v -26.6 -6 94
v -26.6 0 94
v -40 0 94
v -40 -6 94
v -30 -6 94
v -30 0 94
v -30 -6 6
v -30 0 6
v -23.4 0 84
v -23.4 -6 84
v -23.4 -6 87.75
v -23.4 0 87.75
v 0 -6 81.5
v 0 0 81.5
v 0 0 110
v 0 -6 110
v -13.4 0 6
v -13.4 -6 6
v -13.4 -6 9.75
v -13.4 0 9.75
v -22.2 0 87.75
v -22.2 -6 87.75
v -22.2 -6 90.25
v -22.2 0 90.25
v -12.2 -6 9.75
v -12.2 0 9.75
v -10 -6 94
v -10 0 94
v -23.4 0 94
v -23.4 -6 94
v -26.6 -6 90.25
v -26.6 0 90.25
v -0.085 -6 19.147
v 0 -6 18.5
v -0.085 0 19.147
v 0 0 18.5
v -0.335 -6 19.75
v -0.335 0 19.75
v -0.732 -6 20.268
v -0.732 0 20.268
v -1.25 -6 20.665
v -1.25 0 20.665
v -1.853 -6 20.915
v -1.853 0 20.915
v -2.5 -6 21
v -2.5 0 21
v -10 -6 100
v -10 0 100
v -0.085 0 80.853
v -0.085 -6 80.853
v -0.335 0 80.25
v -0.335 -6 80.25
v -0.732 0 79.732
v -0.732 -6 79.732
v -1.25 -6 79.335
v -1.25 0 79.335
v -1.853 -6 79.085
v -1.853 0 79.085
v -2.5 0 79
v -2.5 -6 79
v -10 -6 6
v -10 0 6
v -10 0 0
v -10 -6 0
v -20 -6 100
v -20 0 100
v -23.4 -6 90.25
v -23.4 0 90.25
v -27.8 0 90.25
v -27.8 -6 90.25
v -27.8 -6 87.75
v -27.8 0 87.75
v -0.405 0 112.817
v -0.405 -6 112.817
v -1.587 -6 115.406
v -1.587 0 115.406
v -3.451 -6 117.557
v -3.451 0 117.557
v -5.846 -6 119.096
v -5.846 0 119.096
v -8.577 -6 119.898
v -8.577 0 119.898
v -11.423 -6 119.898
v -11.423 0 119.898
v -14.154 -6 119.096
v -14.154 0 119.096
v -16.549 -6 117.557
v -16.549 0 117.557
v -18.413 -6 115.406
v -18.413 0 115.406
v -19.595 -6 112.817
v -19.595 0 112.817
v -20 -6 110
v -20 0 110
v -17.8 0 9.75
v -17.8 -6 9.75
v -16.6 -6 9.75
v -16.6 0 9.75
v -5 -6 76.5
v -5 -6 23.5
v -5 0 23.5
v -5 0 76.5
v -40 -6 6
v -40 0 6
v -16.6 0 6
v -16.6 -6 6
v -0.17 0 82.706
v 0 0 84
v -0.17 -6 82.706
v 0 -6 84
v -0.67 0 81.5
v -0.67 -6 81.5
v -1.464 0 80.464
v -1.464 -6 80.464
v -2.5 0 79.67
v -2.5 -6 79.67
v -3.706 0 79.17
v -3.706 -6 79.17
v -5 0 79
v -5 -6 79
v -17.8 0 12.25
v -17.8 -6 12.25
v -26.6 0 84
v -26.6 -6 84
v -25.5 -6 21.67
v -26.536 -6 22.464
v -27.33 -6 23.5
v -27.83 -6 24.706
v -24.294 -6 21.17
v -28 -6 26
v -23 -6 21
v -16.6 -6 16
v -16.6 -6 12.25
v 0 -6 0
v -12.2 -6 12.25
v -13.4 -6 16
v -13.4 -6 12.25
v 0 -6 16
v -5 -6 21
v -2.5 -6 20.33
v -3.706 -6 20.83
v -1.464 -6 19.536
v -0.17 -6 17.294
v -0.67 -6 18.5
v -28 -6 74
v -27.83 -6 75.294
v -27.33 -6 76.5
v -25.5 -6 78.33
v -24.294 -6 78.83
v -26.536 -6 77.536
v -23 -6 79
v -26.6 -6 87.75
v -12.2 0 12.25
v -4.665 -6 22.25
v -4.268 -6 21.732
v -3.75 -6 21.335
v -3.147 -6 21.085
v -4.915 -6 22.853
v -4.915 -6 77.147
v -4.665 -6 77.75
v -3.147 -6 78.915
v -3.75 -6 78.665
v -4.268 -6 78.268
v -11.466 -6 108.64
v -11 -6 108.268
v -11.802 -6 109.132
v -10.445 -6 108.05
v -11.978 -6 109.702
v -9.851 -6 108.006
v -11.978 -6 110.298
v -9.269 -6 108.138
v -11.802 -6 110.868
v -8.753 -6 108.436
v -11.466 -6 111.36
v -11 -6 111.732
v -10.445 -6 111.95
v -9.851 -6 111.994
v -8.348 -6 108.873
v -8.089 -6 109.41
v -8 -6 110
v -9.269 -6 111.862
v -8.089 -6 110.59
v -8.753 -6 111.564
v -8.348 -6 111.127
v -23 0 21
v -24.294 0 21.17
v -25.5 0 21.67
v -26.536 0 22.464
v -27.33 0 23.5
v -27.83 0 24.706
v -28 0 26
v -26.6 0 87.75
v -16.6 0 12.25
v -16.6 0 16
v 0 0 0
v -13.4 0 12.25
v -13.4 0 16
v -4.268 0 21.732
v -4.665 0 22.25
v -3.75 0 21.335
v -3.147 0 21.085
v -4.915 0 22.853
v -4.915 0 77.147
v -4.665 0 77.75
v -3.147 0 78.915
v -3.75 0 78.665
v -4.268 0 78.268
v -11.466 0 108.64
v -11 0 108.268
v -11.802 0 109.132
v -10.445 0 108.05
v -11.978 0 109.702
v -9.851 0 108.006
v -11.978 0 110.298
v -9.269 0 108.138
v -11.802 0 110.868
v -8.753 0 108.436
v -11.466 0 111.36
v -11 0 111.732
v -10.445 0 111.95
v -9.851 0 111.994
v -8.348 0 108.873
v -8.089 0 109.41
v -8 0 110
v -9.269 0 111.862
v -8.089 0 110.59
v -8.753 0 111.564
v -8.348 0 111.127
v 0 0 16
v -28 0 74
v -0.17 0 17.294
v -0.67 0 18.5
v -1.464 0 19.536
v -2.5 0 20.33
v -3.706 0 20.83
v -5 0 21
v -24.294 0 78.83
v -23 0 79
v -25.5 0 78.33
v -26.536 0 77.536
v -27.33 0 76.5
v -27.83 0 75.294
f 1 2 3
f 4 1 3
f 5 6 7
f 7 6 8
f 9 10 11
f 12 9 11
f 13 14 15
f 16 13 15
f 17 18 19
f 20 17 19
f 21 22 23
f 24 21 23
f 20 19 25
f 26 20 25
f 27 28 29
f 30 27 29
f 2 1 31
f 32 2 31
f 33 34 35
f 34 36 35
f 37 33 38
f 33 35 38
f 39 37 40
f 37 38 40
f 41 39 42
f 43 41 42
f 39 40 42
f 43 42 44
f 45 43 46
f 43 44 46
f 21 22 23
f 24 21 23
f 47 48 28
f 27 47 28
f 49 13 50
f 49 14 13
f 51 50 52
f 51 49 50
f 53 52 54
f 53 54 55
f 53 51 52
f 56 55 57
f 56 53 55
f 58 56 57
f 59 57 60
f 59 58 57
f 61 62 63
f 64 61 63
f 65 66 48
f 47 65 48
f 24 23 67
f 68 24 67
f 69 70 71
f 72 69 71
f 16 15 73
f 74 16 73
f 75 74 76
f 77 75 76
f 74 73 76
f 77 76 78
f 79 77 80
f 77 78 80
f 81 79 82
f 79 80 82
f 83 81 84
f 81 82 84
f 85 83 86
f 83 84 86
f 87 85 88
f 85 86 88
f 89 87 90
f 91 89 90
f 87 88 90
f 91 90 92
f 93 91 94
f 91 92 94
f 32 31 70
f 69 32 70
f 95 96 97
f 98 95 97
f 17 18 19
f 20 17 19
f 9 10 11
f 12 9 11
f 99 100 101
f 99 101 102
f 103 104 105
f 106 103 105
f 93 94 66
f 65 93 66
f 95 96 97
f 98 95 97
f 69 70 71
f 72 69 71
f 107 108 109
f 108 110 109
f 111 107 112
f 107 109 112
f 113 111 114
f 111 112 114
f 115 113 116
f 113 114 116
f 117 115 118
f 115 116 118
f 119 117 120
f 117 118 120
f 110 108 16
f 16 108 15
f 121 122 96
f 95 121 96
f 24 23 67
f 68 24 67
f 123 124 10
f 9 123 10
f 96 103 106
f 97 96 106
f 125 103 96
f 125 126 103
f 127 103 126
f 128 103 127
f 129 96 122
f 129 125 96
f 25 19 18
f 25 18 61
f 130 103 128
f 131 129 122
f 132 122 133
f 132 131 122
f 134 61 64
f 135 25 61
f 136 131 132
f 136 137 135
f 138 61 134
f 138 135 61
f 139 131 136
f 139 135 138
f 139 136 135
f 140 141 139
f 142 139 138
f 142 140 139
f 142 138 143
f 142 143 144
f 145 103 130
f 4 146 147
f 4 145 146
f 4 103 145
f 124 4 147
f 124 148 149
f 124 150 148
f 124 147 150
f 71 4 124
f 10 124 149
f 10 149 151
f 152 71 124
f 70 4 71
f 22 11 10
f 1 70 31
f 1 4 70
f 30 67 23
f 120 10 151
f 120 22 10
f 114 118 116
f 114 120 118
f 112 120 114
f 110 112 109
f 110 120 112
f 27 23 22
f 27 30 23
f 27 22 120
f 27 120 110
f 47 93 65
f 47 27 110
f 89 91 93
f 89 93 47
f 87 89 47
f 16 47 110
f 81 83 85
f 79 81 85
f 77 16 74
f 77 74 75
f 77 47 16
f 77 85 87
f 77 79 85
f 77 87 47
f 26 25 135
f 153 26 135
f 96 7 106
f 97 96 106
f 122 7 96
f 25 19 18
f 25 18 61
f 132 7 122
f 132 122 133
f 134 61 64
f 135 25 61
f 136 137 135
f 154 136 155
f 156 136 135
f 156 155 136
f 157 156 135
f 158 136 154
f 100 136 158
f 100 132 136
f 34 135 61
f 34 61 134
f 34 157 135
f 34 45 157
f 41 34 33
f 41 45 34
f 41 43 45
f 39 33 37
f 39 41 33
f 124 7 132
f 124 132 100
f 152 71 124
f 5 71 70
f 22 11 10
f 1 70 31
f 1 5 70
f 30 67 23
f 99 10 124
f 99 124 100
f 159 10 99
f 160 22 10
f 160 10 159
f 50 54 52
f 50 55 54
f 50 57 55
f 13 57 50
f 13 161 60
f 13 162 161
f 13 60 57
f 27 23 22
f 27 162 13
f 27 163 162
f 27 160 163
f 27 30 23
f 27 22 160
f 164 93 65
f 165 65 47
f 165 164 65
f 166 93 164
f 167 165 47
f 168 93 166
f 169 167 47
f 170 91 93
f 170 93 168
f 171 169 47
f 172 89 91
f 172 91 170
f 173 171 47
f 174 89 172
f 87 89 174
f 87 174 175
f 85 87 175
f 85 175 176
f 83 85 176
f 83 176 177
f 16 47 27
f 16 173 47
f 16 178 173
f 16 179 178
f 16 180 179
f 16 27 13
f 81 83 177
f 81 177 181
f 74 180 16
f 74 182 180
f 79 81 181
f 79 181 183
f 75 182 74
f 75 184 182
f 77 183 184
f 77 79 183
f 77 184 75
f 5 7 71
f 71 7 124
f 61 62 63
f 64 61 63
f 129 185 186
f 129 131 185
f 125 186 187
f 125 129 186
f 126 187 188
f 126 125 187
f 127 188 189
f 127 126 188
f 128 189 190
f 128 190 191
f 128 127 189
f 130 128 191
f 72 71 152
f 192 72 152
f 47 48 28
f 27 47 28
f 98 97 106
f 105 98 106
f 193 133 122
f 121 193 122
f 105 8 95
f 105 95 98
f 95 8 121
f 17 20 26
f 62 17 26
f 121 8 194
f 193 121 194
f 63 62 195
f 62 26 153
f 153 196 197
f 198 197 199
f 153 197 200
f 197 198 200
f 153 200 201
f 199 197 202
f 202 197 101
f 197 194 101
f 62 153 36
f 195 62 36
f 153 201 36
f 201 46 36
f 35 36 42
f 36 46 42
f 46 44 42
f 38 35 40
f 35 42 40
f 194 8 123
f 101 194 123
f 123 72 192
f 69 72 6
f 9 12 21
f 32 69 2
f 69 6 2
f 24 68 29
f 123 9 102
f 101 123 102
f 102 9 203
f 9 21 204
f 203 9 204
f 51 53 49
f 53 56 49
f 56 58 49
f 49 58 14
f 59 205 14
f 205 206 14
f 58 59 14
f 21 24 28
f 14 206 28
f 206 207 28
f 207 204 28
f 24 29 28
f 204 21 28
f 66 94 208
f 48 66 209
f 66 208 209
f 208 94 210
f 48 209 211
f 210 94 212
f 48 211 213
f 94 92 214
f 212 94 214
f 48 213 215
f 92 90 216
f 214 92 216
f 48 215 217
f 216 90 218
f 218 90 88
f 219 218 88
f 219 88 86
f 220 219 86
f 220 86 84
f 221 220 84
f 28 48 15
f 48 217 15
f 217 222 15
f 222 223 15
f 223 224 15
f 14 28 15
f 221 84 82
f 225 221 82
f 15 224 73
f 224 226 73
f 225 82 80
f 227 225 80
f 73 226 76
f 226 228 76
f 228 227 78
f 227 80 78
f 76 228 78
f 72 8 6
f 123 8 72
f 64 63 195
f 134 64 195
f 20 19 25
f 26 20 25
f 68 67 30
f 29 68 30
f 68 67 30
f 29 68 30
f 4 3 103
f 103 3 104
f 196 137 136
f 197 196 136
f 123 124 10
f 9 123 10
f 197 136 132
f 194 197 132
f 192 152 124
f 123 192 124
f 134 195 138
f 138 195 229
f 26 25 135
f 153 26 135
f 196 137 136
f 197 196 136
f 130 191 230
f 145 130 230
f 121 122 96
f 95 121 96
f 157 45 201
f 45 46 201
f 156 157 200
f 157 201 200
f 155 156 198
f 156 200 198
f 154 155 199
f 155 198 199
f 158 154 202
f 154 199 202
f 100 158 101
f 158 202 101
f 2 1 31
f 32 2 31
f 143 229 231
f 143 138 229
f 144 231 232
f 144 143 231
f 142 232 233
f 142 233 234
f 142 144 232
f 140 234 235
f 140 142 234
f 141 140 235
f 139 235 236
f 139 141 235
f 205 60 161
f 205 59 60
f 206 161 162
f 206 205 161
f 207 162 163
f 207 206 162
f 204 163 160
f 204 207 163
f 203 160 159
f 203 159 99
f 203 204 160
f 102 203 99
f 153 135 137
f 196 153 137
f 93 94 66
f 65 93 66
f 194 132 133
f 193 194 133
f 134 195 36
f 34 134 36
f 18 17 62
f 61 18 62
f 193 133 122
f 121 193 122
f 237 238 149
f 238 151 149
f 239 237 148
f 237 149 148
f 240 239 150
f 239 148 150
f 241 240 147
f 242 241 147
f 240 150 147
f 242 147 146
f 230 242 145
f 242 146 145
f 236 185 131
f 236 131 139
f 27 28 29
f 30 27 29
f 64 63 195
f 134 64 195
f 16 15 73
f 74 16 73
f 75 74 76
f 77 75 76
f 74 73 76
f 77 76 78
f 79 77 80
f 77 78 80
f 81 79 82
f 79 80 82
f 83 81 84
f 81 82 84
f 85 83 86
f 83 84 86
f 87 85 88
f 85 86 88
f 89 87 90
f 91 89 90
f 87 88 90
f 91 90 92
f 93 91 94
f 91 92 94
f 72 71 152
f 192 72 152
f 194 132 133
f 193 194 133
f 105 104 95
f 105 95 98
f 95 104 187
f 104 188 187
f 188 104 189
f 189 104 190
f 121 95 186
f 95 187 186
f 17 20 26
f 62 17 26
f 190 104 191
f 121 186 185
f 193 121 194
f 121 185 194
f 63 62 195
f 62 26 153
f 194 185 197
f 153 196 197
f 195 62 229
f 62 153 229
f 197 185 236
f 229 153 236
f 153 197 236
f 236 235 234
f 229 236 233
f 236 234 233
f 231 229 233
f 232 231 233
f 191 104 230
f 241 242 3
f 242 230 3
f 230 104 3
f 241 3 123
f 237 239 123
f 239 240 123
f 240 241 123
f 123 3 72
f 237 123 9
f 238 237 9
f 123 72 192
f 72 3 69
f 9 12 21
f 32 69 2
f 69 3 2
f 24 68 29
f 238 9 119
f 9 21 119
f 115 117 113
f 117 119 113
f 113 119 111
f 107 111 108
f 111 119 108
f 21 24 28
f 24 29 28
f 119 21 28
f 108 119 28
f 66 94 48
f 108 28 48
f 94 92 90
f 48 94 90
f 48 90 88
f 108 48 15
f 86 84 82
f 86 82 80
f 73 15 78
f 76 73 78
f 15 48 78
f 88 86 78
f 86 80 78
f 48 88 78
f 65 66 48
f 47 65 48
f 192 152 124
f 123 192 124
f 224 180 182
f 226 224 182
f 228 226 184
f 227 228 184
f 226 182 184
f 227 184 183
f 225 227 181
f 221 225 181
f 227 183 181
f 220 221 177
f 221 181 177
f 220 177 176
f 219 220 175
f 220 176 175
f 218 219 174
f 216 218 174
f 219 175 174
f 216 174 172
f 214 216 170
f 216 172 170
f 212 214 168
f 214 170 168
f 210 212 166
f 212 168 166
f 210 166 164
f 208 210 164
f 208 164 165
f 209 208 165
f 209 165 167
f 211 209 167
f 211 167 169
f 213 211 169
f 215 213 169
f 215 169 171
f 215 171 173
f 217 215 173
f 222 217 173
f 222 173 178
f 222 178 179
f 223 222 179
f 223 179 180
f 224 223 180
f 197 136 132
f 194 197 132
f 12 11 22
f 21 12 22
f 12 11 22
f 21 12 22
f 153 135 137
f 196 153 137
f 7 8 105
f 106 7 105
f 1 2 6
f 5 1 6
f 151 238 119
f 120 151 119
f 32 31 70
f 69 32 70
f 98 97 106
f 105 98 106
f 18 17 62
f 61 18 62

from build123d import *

# Parameters (mm, degrees)
F1_DEPTH  = 6
F3_DEPTH  = 6.001
F4_R      = 2
F5_DEPTH  = 6.001
F6_W      = 5
F6_H      = 58
F7_DEPTH  = 6.001
F8_R      = 2.49999
F10_DEPTH = 6
F11_DEPTH = 25
F12_W     = 28
F12_H     = 58
F13_DEPTH = 6
F14_R     = 5


# Not quite as in the source:
# - a fillet or chamfer is up to 0.001 mm smaller than in the source, because OpenCascade refuses the exact size


with BuildPart() as f1:
    # F0 (on Front) → F1 (new body)
    with BuildSketch(Plane.XZ):
        with BuildLine():
            Line((-10, 0), (0, 0))
            Line((0, 0), (0, 110))
            ThreePointArc((0, 110), (-10, 120), (-20, 110))
            Line((-20, 110), (-20, 100))
            Line((-20, 100), (-10, 100))
            Line((-10, 100), (-10, 94))
            Line((-10, 94), (-30, 94))
            Line((-30, 94), (-30, 6))
            Line((-30, 6), (-10, 6))
            Line((-10, 6), (-10, 0))
        make_face()
    extrude(amount=F1_DEPTH)

    # F2 (on face) → F3 (cut, through all)
    with BuildSketch(Plane.XZ.offset(6)):
        Polygon((-16.6, 6), (-15, 6), (-13.4, 6), (-13.4, 9.75), (-12.2, 9.75), (-12.2, 12.25), (-13.4, 12.25), (-13.4, 16), (-15, 16), (-16.6, 16), (-16.6, 12.25), (-17.8, 12.25), (-17.8, 9.75), (-16.6, 9.75), align=None)
        Polygon((-23.4, 94), (-25, 94), (-26.6, 94), (-26.6, 90.25), (-27.8, 90.25), (-27.8, 87.75), (-26.6, 87.75), (-26.6, 84), (-25, 84), (-23.4, 84), (-23.4, 87.75), (-22.2, 87.75), (-22.2, 90.25), (-23.4, 90.25), align=None)
    extrude(amount=-F3_DEPTH, mode=Mode.SUBTRACT)

    # F4 (on face) → F5 (cut, through all)
    with BuildSketch(Plane.XZ.offset(6)):
        with Locations((-10, 110)):
            Circle(F4_R)
    extrude(amount=-F5_DEPTH, mode=Mode.SUBTRACT)

    # F6 (on face) → F7 (cut, through all)
    with BuildSketch(Plane.XZ.offset(6)):
        with Locations((-2.5, 50)):
            Rectangle(F6_W, F6_H)
    extrude(amount=-F7_DEPTH, mode=Mode.SUBTRACT)

    # F8 (radius 2.5 in the source; OpenCascade refuses exactly that, so slightly less here)
    f8_edges = [f1.edges().sort_by_distance(p)[0] for p in [
        (-5, -3, 79),
        (0, -3, 79),
        (-5, -3, 21),
        (0, -3, 21),
    ]]
    fillet(f8_edges, radius=F8_R)


with BuildPart() as f10:
    # F9 (on Front) → F10 (new body)
    with BuildSketch(Plane.XZ):
        with BuildLine():
            Line((-10, 0), (0, 0))
            Line((0, 0), (0, 110))
            ThreePointArc((0, 110), (-10, 120), (-20, 110))
            Line((-20, 110), (-20, 100))
            Line((-20, 100), (-10, 100))
            Line((-10, 100), (-10, 94))
            Line((-10, 94), (-40, 94))
            Line((-40, 94), (-40, 6))
            Line((-40, 6), (-10, 6))
            Line((-10, 6), (-10, 0))
        make_face()
    extrude(amount=F10_DEPTH)

    # F2 (on face) → F11 (cut)
    with BuildSketch(Plane.XZ.offset(6)):
        Polygon((-16.6, 6), (-15, 6), (-13.4, 6), (-13.4, 9.75), (-12.2, 9.75), (-12.2, 12.25), (-13.4, 12.25), (-13.4, 16), (-15, 16), (-16.6, 16), (-16.6, 12.25), (-17.8, 12.25), (-17.8, 9.75), (-16.6, 9.75), align=None)
        Polygon((-23.4, 94), (-25, 94), (-26.6, 94), (-26.6, 90.25), (-27.8, 90.25), (-27.8, 87.75), (-26.6, 87.75), (-26.6, 84), (-25, 84), (-23.4, 84), (-23.4, 87.75), (-22.2, 87.75), (-22.2, 90.25), (-23.4, 90.25), align=None)
    extrude(amount=-F11_DEPTH, mode=Mode.SUBTRACT)

    # F12 (on Front) → F13 (cut, through all)
    with BuildSketch(Plane.XZ):
        with Locations((-14, 50)):
            Rectangle(F12_W, F12_H)
    extrude(amount=F13_DEPTH, mode=Mode.SUBTRACT)

    # F14
    f14_edges = [f10.edges().sort_by_distance(p)[0] for p in [
        (0, -3, 79),
        (0, -3, 21),
        (-28, -3, 21),
        (-28, -3, 79),
    ]]
    fillet(f14_edges, radius=F14_R)


solid = Compound([f1.part, f10.part])
